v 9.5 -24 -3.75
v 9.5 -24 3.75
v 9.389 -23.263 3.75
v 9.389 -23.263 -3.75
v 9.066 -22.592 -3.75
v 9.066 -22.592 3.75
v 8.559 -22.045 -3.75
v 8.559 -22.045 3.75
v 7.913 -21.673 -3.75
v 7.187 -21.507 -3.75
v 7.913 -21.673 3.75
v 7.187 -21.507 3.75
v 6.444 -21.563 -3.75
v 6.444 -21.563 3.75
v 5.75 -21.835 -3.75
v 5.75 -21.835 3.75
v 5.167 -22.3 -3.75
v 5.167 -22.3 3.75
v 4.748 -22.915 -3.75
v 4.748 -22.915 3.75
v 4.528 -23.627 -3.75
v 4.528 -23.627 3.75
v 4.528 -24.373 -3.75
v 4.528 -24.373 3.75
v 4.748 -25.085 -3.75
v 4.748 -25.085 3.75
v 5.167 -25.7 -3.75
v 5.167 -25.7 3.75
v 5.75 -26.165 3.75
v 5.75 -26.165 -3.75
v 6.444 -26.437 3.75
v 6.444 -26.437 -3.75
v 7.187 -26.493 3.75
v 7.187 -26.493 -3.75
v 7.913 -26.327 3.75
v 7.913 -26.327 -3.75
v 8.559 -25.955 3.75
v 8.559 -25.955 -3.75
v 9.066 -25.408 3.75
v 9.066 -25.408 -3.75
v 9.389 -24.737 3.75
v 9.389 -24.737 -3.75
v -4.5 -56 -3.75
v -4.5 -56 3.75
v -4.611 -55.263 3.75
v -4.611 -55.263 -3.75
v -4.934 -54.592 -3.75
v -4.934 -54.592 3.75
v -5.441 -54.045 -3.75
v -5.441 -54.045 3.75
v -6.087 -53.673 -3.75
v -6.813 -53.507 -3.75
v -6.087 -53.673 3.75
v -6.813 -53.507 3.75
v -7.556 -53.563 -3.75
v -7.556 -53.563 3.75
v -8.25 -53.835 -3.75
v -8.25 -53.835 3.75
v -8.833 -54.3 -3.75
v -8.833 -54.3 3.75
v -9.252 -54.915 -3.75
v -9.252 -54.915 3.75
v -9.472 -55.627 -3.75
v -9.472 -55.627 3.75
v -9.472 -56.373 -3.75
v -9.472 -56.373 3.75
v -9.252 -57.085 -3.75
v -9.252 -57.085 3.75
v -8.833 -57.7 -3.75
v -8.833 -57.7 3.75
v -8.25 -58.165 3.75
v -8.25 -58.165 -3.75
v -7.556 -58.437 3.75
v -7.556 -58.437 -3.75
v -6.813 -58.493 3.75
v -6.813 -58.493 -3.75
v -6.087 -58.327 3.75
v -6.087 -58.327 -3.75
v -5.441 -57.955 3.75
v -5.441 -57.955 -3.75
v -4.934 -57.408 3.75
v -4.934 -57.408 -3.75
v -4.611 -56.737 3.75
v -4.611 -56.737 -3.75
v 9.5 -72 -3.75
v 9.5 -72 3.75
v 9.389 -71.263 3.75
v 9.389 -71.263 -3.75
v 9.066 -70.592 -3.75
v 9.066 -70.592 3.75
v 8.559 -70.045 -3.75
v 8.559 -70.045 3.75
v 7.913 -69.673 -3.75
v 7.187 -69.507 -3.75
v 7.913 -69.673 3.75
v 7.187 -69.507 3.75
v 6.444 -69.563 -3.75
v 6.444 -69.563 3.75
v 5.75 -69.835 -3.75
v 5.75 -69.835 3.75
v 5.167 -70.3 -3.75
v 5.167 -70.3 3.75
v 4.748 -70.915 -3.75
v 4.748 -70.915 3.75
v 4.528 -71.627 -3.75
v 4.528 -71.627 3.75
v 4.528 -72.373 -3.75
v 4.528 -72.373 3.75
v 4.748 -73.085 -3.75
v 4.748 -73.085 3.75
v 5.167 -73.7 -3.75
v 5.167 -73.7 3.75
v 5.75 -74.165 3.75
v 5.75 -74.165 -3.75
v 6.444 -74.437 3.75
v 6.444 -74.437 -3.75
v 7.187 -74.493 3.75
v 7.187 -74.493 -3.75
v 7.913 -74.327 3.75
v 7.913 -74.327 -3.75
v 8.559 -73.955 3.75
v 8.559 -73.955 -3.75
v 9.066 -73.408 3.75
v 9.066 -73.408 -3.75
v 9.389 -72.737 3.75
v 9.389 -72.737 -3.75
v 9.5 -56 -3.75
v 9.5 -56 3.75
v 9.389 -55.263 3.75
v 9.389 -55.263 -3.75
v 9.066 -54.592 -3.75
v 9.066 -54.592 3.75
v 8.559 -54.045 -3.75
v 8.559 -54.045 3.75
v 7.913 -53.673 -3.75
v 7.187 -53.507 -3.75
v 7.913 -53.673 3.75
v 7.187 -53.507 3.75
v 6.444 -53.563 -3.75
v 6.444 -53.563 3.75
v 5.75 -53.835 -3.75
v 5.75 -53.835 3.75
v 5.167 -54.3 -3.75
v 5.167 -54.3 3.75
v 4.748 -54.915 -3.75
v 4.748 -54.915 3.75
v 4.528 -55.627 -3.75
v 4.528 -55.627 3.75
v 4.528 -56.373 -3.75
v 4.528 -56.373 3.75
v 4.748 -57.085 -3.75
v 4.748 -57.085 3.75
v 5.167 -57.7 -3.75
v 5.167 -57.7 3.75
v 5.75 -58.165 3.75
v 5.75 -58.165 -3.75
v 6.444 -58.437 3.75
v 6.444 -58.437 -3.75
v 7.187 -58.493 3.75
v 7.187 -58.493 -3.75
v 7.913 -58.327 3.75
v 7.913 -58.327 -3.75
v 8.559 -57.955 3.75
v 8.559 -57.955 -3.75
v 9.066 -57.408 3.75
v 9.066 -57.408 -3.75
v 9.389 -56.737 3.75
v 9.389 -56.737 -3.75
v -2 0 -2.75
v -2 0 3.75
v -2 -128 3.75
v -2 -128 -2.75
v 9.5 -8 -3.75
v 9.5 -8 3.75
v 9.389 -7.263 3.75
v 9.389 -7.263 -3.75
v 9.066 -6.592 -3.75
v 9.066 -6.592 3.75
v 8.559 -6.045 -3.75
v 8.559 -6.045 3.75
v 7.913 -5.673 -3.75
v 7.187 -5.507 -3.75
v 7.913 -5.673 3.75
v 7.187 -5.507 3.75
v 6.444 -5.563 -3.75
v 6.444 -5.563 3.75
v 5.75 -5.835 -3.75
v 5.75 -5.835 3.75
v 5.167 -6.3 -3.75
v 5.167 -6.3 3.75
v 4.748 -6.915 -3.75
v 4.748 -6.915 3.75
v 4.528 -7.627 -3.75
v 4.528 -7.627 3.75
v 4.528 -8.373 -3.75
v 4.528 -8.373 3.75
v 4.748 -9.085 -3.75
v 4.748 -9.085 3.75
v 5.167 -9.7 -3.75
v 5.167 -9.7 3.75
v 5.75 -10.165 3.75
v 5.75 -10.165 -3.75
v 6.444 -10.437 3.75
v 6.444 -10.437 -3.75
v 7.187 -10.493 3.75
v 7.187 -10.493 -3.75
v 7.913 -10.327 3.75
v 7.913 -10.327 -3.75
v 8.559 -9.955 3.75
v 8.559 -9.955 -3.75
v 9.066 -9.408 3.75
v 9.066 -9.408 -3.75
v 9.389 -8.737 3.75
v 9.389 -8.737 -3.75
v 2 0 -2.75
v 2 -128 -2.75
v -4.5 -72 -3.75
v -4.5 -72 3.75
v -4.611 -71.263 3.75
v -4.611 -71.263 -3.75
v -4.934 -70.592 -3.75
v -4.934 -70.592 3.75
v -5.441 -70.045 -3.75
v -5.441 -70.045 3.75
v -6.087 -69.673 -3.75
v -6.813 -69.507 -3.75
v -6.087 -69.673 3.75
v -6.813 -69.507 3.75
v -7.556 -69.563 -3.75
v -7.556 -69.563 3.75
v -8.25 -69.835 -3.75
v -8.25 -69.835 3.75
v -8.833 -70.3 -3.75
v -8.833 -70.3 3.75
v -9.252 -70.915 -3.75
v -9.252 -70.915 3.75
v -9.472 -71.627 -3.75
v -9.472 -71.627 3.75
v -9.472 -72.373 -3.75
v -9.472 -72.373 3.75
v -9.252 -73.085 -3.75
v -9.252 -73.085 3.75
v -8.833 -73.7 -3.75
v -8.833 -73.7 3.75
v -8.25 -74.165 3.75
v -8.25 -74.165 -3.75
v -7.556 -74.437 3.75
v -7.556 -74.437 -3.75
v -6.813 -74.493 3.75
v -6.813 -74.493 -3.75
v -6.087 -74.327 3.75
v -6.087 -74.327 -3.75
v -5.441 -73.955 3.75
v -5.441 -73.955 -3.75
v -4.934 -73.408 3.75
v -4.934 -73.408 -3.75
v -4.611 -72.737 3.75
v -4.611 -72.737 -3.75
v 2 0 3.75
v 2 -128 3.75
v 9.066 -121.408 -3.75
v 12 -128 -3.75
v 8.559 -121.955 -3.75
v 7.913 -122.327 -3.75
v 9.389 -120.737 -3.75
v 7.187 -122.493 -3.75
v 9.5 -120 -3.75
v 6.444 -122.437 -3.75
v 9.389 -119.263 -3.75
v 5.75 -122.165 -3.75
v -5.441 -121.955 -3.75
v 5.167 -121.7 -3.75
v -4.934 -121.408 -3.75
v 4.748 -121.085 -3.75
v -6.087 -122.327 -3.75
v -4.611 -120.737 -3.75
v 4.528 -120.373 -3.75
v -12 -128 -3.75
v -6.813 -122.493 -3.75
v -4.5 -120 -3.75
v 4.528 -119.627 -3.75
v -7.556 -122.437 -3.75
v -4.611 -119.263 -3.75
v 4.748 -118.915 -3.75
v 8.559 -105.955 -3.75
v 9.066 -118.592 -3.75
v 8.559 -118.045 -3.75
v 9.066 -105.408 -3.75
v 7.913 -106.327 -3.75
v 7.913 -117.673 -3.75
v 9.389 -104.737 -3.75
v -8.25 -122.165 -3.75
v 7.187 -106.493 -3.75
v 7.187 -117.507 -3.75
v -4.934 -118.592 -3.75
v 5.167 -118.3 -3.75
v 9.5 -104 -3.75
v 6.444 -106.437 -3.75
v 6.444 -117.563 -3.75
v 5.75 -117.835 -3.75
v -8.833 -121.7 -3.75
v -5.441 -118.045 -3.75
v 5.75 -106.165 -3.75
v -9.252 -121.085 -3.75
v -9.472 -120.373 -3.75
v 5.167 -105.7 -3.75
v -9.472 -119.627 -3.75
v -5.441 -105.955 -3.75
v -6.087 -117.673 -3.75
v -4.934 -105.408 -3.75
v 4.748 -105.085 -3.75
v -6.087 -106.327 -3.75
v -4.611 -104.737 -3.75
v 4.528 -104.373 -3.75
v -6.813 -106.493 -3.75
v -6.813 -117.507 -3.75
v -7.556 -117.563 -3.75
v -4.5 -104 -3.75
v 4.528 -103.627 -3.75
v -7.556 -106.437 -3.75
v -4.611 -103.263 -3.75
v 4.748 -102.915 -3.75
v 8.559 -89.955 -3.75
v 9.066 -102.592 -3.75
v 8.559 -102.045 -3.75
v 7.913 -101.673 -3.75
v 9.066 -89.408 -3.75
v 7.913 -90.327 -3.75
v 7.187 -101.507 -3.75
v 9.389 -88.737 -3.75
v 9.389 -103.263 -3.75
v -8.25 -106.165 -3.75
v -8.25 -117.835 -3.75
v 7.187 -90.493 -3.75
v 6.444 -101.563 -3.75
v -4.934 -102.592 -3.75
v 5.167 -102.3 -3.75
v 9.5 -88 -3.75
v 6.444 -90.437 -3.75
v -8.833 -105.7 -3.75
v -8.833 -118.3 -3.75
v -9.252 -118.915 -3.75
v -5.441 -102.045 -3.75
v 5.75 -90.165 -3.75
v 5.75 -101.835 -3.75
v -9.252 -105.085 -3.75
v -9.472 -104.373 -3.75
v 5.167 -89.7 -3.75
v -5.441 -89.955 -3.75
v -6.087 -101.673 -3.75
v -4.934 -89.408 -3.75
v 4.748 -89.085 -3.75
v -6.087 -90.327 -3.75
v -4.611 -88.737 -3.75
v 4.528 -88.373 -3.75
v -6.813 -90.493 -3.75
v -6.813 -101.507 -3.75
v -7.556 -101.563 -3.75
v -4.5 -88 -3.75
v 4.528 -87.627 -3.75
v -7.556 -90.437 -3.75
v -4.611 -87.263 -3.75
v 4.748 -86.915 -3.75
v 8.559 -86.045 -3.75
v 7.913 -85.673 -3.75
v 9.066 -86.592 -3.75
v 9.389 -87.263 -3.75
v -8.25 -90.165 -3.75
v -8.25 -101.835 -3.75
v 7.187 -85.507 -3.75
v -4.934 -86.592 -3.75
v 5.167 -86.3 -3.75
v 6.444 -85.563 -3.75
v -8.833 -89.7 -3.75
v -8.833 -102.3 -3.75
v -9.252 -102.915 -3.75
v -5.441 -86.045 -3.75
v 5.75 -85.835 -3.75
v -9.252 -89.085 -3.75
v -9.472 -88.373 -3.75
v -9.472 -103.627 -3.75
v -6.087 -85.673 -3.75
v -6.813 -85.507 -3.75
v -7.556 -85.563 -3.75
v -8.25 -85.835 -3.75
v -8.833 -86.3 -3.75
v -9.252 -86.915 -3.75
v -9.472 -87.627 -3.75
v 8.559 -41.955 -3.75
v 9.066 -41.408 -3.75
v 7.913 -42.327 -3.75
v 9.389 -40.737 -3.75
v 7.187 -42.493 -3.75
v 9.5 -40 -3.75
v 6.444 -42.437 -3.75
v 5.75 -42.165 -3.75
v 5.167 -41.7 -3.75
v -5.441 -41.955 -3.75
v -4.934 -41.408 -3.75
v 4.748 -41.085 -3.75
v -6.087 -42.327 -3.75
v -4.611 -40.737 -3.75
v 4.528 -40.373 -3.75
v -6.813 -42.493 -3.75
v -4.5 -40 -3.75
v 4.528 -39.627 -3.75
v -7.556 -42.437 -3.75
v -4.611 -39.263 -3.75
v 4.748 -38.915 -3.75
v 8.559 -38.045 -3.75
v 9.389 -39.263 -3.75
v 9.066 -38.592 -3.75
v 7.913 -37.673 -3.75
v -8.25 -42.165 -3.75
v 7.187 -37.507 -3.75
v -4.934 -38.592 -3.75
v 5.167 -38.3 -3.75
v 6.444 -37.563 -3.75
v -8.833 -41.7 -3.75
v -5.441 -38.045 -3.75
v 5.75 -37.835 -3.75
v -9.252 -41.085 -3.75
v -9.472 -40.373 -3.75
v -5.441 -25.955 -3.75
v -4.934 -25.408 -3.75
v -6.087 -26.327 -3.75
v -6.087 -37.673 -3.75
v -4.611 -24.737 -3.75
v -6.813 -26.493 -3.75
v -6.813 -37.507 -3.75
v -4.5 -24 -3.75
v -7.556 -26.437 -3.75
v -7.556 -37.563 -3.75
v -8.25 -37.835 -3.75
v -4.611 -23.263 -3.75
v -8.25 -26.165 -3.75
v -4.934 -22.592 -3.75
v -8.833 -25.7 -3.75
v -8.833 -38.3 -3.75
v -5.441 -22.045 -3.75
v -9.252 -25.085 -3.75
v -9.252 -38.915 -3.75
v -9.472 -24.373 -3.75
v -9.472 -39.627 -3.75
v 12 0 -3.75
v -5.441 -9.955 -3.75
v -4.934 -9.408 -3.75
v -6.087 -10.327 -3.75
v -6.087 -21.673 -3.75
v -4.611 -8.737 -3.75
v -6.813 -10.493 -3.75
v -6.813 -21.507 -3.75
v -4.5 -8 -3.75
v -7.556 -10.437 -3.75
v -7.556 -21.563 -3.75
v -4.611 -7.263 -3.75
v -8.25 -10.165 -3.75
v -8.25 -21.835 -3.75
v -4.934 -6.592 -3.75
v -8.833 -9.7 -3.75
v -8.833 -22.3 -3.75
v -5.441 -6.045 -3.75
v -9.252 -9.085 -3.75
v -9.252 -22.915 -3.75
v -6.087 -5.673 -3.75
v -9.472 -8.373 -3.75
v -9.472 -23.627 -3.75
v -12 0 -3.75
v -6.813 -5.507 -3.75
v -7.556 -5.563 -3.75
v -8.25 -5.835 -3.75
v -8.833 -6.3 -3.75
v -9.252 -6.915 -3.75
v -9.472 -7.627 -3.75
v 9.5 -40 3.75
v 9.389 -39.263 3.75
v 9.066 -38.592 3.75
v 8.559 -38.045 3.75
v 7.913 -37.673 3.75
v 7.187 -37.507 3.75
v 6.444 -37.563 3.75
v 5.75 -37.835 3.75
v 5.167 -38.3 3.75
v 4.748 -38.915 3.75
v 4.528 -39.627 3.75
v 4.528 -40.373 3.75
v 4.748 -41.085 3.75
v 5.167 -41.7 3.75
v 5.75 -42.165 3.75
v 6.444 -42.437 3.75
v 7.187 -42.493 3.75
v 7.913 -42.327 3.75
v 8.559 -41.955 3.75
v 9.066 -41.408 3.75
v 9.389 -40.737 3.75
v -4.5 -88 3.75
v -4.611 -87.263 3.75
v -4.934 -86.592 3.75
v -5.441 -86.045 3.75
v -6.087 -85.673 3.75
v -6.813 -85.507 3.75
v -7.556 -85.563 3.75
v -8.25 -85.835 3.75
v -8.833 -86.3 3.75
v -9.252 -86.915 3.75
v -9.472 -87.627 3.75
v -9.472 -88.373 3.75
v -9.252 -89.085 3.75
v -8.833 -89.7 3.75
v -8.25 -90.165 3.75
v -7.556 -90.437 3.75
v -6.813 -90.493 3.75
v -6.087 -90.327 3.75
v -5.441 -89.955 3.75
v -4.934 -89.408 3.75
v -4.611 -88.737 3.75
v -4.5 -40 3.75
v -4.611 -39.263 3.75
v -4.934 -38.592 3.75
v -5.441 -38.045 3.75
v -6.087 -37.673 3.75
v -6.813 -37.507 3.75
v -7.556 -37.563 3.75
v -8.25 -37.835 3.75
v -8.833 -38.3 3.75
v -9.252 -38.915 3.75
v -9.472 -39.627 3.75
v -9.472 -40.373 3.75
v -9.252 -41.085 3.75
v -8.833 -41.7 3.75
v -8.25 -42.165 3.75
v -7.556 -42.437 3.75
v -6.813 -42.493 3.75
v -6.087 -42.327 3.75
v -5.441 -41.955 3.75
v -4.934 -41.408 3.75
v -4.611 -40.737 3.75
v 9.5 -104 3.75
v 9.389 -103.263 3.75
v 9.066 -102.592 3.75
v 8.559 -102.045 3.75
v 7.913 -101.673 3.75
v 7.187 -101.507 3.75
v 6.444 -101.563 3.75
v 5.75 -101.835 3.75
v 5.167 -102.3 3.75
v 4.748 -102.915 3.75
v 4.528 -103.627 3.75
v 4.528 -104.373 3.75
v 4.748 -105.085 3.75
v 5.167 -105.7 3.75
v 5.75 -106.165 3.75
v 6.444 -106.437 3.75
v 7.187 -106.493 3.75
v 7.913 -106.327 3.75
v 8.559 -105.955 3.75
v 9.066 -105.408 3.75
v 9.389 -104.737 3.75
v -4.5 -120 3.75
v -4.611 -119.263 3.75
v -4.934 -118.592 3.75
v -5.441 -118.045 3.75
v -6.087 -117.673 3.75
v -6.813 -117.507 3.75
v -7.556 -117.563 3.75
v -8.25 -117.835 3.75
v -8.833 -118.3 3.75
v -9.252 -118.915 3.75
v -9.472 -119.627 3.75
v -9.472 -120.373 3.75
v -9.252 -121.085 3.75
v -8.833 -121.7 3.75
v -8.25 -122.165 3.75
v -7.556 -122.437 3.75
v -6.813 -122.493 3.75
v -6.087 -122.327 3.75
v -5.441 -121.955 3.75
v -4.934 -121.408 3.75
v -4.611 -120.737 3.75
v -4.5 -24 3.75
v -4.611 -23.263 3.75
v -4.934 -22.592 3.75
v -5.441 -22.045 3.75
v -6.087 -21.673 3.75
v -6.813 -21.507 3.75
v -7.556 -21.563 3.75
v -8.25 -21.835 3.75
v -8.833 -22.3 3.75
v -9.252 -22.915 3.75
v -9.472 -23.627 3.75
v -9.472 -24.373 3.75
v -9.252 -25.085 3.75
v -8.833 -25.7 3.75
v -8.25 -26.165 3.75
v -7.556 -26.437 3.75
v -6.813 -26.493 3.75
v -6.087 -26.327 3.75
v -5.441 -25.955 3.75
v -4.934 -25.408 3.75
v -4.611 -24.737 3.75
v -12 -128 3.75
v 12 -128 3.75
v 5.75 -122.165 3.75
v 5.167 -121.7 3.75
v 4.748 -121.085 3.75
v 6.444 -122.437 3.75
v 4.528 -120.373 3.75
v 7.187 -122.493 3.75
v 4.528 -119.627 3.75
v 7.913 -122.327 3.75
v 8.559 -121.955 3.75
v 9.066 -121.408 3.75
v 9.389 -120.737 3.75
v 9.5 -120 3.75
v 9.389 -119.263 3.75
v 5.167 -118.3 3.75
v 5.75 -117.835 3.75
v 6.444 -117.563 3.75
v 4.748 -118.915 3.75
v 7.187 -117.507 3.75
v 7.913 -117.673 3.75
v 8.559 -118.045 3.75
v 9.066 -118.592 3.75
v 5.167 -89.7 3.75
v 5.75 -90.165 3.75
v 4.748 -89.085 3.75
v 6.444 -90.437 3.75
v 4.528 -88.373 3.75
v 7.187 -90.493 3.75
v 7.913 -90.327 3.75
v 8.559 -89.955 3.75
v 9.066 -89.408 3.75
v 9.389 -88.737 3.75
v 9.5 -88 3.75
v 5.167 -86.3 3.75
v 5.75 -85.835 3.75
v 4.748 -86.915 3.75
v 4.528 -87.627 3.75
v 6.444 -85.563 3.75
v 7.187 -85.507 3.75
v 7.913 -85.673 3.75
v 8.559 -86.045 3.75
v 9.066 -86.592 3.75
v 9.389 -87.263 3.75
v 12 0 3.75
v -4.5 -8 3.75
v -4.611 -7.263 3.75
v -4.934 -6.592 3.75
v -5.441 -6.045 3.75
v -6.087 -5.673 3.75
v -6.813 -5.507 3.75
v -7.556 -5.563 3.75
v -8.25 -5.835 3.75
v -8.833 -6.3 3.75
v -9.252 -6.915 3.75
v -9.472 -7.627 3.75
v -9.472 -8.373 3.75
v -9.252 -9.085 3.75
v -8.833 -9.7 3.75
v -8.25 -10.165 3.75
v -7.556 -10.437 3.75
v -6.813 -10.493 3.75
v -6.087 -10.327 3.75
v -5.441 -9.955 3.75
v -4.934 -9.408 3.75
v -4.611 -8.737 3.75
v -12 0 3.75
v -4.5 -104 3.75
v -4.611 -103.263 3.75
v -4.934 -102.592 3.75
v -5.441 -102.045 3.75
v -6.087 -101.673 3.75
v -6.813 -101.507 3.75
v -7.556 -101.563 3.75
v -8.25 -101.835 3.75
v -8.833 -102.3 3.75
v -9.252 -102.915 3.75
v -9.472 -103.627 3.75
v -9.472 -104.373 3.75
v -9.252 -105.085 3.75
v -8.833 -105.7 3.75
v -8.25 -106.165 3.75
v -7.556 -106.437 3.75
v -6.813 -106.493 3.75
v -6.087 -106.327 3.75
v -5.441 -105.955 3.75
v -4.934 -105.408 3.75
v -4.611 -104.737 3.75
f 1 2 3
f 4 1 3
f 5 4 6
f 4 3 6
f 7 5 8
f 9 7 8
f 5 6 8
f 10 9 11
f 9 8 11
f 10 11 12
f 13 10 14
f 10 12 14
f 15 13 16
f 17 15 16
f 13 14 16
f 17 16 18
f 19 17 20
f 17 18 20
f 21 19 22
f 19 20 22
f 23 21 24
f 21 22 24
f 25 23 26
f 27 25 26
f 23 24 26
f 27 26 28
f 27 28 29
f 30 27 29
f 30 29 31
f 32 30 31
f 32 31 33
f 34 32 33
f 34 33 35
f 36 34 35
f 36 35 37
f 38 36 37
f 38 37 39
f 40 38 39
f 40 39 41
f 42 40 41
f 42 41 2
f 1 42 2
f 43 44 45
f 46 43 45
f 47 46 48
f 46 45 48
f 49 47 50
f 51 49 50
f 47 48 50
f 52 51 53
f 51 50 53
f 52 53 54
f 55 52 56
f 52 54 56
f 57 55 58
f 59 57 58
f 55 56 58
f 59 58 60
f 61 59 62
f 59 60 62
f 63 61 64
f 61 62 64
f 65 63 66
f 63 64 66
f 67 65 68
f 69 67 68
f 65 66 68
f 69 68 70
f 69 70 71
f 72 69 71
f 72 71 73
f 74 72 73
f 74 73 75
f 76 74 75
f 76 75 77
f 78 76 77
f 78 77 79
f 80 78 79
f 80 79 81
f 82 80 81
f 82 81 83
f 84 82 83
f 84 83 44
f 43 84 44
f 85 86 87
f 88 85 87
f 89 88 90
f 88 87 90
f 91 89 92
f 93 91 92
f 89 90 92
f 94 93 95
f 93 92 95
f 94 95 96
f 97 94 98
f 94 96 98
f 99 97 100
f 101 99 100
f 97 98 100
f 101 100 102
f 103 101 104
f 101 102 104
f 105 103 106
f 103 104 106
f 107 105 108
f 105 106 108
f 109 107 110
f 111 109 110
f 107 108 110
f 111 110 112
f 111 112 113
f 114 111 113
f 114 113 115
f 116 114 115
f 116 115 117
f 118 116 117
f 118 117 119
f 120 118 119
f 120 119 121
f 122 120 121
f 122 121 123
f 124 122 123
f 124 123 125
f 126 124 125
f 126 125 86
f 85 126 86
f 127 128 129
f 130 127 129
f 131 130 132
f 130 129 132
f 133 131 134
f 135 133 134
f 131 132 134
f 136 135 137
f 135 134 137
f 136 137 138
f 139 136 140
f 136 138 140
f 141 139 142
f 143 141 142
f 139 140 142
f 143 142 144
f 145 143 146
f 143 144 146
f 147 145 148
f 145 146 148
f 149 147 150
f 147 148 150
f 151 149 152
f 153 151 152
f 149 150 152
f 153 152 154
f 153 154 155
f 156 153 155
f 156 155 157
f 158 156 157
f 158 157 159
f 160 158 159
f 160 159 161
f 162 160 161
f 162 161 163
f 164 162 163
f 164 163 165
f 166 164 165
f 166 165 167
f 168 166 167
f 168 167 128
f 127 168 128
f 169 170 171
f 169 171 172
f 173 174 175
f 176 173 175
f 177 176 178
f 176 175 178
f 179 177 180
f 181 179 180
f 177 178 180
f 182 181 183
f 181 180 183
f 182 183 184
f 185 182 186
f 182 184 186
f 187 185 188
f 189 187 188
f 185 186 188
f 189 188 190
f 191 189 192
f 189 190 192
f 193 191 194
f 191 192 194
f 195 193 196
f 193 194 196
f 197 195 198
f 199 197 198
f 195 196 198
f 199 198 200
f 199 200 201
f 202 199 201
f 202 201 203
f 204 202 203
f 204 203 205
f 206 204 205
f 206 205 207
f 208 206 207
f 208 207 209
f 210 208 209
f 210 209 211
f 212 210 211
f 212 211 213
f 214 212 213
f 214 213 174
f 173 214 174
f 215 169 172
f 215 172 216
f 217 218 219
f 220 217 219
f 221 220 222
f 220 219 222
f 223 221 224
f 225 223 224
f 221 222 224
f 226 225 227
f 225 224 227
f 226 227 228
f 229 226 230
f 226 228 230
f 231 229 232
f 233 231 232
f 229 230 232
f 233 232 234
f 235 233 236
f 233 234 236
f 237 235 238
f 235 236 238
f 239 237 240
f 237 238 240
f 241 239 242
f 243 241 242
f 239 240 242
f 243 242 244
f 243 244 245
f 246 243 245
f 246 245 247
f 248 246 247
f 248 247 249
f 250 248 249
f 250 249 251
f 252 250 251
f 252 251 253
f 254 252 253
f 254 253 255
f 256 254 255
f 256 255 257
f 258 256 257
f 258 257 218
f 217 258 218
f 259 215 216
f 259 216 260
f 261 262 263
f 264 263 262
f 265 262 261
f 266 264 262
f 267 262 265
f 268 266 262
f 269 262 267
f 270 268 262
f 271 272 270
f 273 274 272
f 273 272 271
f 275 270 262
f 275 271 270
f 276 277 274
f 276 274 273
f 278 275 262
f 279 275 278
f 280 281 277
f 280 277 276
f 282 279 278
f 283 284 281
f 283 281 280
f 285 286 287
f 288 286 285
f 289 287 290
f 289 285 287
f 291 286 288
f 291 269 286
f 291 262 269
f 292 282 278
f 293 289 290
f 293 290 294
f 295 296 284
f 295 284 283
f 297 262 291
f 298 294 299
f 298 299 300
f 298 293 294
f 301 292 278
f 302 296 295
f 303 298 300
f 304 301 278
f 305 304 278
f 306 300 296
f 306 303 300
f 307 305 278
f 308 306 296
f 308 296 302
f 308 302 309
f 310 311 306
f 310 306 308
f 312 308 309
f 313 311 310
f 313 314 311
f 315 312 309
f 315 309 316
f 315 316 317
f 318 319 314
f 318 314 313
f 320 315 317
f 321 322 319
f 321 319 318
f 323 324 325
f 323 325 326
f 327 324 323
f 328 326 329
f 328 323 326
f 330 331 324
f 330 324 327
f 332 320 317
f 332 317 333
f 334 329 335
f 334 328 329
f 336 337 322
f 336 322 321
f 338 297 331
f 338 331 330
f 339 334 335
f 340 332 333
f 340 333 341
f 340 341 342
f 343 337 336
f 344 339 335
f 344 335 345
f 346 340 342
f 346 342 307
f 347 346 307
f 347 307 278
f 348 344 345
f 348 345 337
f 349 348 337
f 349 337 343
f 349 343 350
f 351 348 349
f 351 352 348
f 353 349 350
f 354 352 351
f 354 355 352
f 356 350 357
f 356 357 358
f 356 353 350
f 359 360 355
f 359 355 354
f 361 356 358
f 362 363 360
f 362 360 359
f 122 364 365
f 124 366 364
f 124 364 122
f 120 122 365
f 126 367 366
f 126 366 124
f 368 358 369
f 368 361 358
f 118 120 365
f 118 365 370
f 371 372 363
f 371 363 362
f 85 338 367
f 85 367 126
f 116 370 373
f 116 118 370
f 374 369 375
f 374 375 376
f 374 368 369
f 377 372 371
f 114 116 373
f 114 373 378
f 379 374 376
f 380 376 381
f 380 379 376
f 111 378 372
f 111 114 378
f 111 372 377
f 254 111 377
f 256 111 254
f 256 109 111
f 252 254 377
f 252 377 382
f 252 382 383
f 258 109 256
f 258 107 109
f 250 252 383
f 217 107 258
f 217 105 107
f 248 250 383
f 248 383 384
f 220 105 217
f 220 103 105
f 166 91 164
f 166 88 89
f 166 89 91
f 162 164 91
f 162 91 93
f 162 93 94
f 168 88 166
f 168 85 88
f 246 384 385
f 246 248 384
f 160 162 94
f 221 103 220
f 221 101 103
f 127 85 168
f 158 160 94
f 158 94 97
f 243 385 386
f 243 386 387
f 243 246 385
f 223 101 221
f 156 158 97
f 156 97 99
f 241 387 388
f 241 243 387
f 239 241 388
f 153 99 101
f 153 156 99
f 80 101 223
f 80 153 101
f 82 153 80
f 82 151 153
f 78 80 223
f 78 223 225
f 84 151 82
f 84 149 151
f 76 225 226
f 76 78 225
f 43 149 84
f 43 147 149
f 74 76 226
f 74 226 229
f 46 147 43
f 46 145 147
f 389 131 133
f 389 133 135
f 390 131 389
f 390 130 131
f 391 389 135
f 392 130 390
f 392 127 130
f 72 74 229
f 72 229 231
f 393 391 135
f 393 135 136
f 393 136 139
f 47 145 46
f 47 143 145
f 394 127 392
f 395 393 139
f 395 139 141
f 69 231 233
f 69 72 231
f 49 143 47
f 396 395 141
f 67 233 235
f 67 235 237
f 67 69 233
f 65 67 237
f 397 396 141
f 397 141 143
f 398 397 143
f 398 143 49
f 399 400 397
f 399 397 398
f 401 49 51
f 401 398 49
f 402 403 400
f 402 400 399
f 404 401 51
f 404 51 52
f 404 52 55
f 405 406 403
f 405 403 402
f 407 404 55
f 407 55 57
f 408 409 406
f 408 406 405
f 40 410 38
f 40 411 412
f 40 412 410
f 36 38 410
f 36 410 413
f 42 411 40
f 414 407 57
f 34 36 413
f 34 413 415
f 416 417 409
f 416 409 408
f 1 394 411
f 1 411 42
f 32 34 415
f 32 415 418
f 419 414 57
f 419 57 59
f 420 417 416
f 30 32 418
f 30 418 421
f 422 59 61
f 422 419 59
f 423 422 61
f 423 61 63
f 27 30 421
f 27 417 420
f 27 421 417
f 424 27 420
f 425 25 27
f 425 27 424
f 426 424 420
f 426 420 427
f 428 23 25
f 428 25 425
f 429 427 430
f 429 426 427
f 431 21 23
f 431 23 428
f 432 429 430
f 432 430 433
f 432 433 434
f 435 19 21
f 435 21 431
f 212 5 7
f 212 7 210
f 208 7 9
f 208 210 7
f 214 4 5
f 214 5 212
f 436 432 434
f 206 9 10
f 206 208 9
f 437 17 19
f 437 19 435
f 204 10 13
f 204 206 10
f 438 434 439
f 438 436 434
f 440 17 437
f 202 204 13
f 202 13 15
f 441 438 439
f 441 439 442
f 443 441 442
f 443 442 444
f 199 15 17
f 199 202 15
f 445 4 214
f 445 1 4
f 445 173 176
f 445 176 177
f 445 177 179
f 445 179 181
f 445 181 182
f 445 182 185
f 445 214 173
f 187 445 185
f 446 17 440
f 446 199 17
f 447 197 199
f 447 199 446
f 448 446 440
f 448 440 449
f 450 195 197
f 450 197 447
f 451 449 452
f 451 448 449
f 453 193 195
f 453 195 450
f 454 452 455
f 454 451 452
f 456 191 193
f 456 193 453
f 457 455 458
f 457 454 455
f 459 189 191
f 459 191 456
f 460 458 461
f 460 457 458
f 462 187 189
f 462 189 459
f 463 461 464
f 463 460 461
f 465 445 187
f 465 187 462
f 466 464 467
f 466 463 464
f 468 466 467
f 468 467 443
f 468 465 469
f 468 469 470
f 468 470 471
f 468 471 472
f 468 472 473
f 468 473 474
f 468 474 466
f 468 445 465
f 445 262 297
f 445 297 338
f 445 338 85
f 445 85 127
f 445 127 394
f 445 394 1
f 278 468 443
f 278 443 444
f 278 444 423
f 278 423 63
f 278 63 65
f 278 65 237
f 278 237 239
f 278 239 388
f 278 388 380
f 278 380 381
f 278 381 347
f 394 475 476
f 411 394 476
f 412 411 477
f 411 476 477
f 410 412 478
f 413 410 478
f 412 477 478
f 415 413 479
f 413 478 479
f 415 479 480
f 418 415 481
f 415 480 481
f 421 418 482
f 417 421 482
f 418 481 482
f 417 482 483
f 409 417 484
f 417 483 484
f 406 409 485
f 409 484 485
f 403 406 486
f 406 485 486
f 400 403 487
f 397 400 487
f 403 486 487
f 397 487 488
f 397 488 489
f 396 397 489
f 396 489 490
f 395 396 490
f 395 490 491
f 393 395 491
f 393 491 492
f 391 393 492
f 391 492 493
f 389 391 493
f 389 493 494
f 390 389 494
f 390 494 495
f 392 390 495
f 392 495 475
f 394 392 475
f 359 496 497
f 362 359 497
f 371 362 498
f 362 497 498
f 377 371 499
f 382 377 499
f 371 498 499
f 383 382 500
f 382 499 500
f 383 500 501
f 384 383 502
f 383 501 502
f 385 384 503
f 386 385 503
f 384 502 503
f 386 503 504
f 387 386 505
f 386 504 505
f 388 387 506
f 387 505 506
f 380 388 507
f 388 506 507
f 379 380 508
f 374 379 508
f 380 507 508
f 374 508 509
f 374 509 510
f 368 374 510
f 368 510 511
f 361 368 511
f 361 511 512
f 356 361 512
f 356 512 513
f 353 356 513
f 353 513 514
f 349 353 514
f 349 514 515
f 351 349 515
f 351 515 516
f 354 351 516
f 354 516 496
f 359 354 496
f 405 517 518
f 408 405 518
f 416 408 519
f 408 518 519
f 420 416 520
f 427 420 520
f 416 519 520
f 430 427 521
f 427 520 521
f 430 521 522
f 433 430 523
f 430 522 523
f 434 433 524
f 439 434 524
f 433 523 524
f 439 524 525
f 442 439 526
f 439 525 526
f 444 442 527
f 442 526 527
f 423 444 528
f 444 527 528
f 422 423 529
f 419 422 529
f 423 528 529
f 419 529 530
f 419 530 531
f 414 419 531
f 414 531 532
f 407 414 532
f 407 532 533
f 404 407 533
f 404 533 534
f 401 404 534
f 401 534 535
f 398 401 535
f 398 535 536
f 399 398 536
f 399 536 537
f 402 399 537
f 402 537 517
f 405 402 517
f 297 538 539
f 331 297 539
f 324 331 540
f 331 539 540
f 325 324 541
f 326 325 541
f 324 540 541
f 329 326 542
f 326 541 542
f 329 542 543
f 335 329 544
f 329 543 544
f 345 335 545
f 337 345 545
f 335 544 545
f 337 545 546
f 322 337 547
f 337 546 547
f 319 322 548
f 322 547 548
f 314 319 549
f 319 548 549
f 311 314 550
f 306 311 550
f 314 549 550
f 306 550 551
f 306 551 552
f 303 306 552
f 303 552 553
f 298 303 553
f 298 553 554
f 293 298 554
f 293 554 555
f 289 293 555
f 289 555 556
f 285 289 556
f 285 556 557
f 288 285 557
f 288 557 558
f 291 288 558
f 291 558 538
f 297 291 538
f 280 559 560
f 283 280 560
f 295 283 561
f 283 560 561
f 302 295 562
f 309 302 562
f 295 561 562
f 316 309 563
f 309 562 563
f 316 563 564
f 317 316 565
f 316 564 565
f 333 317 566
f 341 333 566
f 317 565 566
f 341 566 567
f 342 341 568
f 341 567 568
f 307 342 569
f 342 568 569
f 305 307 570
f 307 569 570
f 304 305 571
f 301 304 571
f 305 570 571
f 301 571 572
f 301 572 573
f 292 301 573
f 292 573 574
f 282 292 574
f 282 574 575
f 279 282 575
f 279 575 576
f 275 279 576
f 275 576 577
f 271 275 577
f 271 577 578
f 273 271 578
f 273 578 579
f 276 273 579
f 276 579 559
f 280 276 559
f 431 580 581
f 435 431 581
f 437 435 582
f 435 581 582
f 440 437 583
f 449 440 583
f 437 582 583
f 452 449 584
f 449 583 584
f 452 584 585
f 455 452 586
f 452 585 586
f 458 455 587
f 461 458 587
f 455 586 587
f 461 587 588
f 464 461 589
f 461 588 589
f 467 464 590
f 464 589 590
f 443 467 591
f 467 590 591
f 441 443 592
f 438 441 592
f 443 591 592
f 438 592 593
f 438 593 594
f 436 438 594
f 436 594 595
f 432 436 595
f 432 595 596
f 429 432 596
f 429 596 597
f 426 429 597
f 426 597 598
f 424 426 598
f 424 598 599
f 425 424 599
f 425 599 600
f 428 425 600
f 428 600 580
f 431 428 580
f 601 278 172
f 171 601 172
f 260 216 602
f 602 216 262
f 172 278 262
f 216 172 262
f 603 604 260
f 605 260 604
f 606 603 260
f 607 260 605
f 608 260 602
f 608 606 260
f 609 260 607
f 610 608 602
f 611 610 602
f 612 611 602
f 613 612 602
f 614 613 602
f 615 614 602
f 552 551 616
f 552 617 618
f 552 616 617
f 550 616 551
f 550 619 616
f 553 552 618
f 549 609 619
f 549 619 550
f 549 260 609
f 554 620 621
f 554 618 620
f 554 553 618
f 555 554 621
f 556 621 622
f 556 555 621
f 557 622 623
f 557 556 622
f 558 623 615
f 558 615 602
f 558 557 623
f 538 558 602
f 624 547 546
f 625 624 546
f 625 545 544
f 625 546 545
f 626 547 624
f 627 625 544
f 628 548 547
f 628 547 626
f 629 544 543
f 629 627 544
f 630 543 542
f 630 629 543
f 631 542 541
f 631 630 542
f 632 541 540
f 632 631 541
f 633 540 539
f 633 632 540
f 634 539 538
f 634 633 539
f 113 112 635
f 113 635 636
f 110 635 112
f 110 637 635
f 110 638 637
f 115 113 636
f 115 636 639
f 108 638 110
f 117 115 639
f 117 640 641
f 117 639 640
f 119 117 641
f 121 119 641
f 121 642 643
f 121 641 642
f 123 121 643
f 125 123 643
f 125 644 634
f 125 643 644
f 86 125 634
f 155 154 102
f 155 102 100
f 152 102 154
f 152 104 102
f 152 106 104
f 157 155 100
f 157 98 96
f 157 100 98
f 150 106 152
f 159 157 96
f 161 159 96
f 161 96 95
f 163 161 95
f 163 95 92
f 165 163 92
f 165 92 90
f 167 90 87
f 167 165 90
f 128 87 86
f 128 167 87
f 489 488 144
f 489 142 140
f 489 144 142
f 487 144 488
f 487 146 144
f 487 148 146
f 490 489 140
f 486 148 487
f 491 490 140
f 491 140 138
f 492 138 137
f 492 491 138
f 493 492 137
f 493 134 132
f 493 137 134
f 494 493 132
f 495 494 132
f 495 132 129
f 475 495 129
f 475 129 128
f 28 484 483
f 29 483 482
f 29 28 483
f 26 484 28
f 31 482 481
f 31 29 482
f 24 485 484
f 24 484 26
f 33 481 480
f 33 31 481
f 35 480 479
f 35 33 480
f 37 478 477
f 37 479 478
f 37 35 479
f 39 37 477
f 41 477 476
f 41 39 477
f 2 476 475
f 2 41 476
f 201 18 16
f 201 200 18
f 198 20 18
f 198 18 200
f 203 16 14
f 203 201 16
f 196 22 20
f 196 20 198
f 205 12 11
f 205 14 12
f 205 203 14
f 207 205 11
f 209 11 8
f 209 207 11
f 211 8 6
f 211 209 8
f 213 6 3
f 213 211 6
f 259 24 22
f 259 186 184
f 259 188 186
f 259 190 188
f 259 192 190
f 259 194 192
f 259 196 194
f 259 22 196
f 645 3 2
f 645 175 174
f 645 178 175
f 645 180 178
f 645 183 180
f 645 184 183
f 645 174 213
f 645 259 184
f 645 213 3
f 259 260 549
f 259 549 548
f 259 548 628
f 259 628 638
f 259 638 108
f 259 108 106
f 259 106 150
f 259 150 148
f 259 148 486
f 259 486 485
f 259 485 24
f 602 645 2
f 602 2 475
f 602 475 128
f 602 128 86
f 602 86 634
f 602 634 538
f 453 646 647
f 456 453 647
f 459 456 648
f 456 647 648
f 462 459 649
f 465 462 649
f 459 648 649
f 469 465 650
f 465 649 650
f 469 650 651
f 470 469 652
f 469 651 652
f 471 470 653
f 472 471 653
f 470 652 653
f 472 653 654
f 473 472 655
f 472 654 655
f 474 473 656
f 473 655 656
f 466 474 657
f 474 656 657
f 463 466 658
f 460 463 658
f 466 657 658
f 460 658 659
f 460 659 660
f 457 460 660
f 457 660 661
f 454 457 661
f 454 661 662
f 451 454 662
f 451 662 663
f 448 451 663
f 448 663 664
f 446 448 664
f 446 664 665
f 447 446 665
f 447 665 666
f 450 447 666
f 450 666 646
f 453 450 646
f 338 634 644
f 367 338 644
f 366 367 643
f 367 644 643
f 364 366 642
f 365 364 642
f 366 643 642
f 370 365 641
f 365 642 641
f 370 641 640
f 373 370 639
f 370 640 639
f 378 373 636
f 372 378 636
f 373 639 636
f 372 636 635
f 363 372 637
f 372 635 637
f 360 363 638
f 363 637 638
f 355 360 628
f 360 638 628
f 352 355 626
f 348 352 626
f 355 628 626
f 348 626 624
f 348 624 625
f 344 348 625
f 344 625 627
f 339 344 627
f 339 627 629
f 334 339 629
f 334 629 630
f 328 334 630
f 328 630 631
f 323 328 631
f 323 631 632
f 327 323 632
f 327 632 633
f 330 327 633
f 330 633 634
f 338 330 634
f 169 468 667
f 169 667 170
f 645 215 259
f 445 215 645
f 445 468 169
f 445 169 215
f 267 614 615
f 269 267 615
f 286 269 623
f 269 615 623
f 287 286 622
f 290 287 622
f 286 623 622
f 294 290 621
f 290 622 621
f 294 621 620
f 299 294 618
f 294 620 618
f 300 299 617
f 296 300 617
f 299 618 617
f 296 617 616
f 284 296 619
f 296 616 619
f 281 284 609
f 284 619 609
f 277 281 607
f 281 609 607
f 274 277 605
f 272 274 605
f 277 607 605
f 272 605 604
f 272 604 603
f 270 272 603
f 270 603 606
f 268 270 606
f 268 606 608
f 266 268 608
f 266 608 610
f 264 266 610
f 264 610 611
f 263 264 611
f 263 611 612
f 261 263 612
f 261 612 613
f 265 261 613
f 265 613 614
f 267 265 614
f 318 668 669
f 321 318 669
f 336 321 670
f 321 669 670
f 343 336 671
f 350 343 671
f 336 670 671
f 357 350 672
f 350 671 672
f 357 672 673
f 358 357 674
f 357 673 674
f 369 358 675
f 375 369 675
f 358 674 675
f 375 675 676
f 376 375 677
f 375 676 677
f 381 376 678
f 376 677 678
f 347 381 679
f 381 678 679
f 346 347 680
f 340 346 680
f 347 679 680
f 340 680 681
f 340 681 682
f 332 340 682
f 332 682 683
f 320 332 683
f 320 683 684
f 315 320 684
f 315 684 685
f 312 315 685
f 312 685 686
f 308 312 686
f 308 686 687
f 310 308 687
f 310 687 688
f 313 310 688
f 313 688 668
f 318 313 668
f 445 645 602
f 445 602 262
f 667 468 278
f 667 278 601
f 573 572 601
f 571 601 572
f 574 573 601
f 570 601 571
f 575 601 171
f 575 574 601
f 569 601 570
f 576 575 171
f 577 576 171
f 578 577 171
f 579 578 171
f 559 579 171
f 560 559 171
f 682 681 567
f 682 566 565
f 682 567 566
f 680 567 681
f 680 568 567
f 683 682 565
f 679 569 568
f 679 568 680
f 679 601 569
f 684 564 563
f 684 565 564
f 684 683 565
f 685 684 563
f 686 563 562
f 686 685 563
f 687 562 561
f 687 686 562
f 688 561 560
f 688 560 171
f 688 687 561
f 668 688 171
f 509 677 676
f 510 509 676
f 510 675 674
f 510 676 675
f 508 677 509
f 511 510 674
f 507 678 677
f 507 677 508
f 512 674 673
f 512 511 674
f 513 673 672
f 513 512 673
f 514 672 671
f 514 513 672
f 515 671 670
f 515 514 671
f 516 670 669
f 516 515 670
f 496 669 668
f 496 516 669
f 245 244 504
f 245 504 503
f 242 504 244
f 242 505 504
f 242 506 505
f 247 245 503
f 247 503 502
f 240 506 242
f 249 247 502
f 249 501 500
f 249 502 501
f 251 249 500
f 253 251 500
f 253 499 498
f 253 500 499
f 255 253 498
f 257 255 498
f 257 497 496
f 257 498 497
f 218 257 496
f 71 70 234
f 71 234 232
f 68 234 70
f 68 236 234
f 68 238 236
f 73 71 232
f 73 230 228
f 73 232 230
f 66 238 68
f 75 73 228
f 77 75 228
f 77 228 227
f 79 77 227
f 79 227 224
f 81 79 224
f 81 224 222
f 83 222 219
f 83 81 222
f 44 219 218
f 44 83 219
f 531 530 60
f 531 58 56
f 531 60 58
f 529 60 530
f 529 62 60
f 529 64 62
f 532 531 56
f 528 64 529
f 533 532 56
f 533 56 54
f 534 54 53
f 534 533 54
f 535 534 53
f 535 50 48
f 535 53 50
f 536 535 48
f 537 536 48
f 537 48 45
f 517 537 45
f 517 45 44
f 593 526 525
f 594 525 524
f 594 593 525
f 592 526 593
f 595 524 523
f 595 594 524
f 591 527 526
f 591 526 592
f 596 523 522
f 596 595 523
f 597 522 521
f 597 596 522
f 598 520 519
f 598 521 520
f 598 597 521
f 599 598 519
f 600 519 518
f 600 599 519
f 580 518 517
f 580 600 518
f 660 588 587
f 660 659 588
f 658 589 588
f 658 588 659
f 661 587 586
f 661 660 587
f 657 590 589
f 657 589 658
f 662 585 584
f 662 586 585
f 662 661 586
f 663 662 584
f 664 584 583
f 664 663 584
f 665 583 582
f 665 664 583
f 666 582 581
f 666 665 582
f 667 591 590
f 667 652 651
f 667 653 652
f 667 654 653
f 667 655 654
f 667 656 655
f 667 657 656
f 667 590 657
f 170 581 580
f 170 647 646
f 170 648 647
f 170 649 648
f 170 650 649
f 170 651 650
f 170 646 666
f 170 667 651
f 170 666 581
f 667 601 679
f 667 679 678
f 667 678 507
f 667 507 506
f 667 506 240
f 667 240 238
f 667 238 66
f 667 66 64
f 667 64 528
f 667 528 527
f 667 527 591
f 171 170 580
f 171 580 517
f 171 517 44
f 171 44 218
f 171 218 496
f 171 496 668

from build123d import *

# Parameters (mm, degrees)
BASE_DEPTH  = 128
ESQUISSE2_R = 2.5
TROU_DEPTH  = 129.779850908


with BuildPart() as part:
    # Esquisse1 → BASE (new body)
    with BuildSketch(Plane(origin=(0, 0, 0), x_dir=(1, 0, 0), z_dir=(0, 1, 0))):
        Polygon((-2, -3.75), (-2, 2.75), (2, 2.75), (2, -3.75), (12, -3.75), (12, 3.75), (-12, 3.75), (-12, -3.75), align=None)
    extrude(amount=-BASE_DEPTH)

    # Esquisse2 → TROU (cut, through all)
    with BuildSketch(Plane.XY.offset(3.75)):
        with Locations((-7, -8)):
            Circle(ESQUISSE2_R)
        with Locations((7, -8)):
            Circle(ESQUISSE2_R)
        with Locations((7, -24)):
            Circle(ESQUISSE2_R)
        with Locations((7, -40)):
            Circle(ESQUISSE2_R)
        with Locations((7, -56)):
            Circle(ESQUISSE2_R)
        with Locations((7, -72)):
            Circle(ESQUISSE2_R)
        with Locations((7, -88)):
            Circle(ESQUISSE2_R)
        with Locations((7, -104)):
            Circle(ESQUISSE2_R)
        with Locations((7, -120)):
            Circle(ESQUISSE2_R)
        with Locations((-7, -24)):
            Circle(ESQUISSE2_R)
        with Locations((-7, -40)):
            Circle(ESQUISSE2_R)
        with Locations((-7, -56)):
            Circle(ESQUISSE2_R)
        with Locations((-7, -72)):
            Circle(ESQUISSE2_R)
        with Locations((-7, -88)):
            Circle(ESQUISSE2_R)
        with Locations((-7, -104)):
            Circle(ESQUISSE2_R)
        with Locations((-7, -120)):
            Circle(ESQUISSE2_R)
    extrude(amount=-TROU_DEPTH, mode=Mode.SUBTRACT)


solid = part.part
